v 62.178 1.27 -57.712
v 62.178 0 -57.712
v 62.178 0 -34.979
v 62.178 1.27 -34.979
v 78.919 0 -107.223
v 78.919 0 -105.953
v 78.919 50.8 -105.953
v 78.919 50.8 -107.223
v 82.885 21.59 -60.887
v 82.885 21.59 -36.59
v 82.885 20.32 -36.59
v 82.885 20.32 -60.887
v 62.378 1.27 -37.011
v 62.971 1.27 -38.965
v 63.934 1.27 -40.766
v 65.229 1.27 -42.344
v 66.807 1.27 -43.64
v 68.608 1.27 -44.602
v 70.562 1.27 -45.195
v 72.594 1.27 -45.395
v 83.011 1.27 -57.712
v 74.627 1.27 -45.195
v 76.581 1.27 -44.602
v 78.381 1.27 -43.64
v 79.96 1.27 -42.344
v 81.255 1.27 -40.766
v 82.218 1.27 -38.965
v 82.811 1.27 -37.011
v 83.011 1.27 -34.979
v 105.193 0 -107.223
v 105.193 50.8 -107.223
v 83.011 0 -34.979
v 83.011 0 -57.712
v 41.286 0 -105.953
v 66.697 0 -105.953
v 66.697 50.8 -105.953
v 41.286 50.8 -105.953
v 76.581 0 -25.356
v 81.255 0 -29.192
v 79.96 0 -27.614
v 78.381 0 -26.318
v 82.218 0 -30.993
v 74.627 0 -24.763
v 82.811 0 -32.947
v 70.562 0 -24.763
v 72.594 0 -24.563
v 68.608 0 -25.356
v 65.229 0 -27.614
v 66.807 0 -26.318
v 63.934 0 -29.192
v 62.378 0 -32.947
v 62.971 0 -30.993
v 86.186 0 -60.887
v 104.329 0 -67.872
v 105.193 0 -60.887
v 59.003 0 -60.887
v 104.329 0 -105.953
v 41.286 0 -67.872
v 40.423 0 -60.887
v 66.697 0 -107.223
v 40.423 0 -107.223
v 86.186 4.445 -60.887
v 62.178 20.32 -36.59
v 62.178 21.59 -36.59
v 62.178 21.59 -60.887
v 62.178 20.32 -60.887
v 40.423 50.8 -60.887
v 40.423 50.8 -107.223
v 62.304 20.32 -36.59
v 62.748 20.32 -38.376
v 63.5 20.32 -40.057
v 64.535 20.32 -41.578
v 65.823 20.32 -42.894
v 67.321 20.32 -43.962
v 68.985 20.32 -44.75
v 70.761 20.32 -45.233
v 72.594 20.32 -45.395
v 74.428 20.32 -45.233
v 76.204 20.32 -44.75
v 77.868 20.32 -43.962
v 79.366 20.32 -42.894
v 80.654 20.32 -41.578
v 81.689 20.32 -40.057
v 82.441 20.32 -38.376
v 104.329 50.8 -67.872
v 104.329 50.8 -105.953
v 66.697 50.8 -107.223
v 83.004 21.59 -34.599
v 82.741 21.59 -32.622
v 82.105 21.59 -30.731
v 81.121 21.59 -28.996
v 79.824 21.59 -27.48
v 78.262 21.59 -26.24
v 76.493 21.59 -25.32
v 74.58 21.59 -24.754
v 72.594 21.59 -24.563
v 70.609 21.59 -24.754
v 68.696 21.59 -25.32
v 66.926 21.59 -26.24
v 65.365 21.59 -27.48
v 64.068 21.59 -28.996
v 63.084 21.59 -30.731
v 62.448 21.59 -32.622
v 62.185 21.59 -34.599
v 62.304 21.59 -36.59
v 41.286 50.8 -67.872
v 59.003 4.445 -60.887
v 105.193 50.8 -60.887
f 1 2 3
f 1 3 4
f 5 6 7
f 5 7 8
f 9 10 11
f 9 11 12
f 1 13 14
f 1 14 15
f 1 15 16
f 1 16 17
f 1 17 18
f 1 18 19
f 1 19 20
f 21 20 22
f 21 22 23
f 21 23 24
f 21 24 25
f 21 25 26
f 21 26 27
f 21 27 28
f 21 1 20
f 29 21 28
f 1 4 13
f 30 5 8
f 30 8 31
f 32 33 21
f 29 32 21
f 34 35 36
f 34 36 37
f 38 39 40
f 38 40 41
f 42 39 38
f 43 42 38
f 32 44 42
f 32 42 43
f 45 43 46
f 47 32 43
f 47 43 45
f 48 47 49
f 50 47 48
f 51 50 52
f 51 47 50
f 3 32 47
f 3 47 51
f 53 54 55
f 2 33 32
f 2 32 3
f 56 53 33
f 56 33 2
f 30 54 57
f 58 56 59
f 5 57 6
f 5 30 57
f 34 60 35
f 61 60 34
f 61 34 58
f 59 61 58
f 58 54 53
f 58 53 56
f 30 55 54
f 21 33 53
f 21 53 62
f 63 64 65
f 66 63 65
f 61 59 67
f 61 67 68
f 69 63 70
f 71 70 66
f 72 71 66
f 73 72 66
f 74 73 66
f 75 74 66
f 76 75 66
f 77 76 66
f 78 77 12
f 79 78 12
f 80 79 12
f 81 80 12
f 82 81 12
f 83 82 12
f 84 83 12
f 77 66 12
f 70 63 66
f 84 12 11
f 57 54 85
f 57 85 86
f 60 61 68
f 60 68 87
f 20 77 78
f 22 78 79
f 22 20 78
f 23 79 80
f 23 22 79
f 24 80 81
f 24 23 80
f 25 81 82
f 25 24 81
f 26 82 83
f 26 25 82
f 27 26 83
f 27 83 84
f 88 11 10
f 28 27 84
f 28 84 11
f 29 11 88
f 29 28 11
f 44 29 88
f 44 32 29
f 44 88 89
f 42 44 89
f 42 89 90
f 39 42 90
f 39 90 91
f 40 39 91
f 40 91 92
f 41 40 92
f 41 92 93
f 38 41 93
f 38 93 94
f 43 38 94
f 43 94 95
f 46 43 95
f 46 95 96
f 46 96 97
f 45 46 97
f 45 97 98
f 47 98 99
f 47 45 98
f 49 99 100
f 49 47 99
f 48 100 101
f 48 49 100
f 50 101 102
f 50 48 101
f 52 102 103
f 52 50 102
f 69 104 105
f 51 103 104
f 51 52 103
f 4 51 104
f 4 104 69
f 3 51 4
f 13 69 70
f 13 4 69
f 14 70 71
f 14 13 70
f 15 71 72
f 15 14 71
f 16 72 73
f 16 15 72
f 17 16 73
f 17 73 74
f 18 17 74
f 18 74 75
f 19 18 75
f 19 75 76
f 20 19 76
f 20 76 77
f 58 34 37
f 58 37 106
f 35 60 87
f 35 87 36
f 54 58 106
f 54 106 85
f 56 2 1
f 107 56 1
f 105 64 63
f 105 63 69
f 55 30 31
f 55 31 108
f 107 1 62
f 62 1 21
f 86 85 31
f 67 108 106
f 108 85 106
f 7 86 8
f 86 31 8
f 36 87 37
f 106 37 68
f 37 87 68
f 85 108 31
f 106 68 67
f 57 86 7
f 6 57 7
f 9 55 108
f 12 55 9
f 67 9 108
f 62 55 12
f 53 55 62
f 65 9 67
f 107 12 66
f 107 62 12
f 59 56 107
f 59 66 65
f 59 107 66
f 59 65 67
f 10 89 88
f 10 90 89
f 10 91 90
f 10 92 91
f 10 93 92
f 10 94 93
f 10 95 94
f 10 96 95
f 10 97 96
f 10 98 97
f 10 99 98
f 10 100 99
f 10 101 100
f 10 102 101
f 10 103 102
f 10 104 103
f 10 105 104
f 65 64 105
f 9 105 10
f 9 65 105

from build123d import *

# Parameters (mm, degrees)
BOSS_EXTRUDE1_DEPTH = 50.8
SKETCH3_W           = 20.832647018
SKETCH3_H           = 1.27
BOSS_EXTRUDE2_DEPTH = 25.908
SKETCH5_R           = 10.416323509
BOSS_EXTRUDE3_DEPTH = 21.59
SKETCH14_W          = 20.707274924
SKETCH14_H          = 24.296753771
BOSS_EXTRUDE7_DEPTH = 1.27
CHAMFER2_SIZE       = 3.175


with BuildPart() as part:
    # Sketch2 → Boss-Extrude1 (new body)
    with BuildSketch(Plane(origin=(0, 0, 0), x_dir=(1, 0, 0), z_dir=(0, 1, 0))):
        Polygon((66.696577012, 107.222916401), (66.696577012, 105.952916401), (41.286417012, 105.952916401), (41.286417012, 67.871966401), (104.329217012, 67.871966401), (104.329217012, 105.952916401), (78.919057012, 105.952916401), (78.919057012, 107.222916401), (105.192817012, 107.222916401), (105.192817012, 60.886966401), (40.422817012, 60.886966401), (40.422817012, 107.222916401), align=None)
    extrude(amount=BOSS_EXTRUDE1_DEPTH)

    # Sketch3 → Boss-Extrude2 (add)
    with BuildSketch(Plane.XY.offset(-60.886966401)):
        with Locations((72.594457012, 0.635)):
            Rectangle(SKETCH3_W, SKETCH3_H)
    extrude(amount=BOSS_EXTRUDE2_DEPTH)

    # Sketch5 → Boss-Extrude3 (add)
    with BuildSketch(Plane.XZ):
        with Locations(Location((72.594457012, -34.978966401, 0), (0, 0, 270))):
            Circle(SKETCH5_R)
    extrude(amount=-BOSS_EXTRUDE3_DEPTH)

    # Sketch14 → Boss-Extrude7 (add)
    with BuildSketch(Plane(origin=(0, 21.59, 0), x_dir=(1, 0, 0), z_dir=(0, 1, 0))):
        with Locations((72.531770965, 48.738589516)):
            Rectangle(SKETCH14_W, SKETCH14_H)
    extrude(amount=-BOSS_EXTRUDE7_DEPTH)

    # Chamfer2
    chamfer2_edges = [part.edges().sort_by_distance(p)[0] for p in [
        (62.178133503, 0.635, -60.886966401),
        (83.010780521, 0.635, -60.886966401),
        (72.594457012, 1.27, -60.886966401),
    ]]
    chamfer(chamfer2_edges, length=CHAMFER2_SIZE)


solid = part.part
